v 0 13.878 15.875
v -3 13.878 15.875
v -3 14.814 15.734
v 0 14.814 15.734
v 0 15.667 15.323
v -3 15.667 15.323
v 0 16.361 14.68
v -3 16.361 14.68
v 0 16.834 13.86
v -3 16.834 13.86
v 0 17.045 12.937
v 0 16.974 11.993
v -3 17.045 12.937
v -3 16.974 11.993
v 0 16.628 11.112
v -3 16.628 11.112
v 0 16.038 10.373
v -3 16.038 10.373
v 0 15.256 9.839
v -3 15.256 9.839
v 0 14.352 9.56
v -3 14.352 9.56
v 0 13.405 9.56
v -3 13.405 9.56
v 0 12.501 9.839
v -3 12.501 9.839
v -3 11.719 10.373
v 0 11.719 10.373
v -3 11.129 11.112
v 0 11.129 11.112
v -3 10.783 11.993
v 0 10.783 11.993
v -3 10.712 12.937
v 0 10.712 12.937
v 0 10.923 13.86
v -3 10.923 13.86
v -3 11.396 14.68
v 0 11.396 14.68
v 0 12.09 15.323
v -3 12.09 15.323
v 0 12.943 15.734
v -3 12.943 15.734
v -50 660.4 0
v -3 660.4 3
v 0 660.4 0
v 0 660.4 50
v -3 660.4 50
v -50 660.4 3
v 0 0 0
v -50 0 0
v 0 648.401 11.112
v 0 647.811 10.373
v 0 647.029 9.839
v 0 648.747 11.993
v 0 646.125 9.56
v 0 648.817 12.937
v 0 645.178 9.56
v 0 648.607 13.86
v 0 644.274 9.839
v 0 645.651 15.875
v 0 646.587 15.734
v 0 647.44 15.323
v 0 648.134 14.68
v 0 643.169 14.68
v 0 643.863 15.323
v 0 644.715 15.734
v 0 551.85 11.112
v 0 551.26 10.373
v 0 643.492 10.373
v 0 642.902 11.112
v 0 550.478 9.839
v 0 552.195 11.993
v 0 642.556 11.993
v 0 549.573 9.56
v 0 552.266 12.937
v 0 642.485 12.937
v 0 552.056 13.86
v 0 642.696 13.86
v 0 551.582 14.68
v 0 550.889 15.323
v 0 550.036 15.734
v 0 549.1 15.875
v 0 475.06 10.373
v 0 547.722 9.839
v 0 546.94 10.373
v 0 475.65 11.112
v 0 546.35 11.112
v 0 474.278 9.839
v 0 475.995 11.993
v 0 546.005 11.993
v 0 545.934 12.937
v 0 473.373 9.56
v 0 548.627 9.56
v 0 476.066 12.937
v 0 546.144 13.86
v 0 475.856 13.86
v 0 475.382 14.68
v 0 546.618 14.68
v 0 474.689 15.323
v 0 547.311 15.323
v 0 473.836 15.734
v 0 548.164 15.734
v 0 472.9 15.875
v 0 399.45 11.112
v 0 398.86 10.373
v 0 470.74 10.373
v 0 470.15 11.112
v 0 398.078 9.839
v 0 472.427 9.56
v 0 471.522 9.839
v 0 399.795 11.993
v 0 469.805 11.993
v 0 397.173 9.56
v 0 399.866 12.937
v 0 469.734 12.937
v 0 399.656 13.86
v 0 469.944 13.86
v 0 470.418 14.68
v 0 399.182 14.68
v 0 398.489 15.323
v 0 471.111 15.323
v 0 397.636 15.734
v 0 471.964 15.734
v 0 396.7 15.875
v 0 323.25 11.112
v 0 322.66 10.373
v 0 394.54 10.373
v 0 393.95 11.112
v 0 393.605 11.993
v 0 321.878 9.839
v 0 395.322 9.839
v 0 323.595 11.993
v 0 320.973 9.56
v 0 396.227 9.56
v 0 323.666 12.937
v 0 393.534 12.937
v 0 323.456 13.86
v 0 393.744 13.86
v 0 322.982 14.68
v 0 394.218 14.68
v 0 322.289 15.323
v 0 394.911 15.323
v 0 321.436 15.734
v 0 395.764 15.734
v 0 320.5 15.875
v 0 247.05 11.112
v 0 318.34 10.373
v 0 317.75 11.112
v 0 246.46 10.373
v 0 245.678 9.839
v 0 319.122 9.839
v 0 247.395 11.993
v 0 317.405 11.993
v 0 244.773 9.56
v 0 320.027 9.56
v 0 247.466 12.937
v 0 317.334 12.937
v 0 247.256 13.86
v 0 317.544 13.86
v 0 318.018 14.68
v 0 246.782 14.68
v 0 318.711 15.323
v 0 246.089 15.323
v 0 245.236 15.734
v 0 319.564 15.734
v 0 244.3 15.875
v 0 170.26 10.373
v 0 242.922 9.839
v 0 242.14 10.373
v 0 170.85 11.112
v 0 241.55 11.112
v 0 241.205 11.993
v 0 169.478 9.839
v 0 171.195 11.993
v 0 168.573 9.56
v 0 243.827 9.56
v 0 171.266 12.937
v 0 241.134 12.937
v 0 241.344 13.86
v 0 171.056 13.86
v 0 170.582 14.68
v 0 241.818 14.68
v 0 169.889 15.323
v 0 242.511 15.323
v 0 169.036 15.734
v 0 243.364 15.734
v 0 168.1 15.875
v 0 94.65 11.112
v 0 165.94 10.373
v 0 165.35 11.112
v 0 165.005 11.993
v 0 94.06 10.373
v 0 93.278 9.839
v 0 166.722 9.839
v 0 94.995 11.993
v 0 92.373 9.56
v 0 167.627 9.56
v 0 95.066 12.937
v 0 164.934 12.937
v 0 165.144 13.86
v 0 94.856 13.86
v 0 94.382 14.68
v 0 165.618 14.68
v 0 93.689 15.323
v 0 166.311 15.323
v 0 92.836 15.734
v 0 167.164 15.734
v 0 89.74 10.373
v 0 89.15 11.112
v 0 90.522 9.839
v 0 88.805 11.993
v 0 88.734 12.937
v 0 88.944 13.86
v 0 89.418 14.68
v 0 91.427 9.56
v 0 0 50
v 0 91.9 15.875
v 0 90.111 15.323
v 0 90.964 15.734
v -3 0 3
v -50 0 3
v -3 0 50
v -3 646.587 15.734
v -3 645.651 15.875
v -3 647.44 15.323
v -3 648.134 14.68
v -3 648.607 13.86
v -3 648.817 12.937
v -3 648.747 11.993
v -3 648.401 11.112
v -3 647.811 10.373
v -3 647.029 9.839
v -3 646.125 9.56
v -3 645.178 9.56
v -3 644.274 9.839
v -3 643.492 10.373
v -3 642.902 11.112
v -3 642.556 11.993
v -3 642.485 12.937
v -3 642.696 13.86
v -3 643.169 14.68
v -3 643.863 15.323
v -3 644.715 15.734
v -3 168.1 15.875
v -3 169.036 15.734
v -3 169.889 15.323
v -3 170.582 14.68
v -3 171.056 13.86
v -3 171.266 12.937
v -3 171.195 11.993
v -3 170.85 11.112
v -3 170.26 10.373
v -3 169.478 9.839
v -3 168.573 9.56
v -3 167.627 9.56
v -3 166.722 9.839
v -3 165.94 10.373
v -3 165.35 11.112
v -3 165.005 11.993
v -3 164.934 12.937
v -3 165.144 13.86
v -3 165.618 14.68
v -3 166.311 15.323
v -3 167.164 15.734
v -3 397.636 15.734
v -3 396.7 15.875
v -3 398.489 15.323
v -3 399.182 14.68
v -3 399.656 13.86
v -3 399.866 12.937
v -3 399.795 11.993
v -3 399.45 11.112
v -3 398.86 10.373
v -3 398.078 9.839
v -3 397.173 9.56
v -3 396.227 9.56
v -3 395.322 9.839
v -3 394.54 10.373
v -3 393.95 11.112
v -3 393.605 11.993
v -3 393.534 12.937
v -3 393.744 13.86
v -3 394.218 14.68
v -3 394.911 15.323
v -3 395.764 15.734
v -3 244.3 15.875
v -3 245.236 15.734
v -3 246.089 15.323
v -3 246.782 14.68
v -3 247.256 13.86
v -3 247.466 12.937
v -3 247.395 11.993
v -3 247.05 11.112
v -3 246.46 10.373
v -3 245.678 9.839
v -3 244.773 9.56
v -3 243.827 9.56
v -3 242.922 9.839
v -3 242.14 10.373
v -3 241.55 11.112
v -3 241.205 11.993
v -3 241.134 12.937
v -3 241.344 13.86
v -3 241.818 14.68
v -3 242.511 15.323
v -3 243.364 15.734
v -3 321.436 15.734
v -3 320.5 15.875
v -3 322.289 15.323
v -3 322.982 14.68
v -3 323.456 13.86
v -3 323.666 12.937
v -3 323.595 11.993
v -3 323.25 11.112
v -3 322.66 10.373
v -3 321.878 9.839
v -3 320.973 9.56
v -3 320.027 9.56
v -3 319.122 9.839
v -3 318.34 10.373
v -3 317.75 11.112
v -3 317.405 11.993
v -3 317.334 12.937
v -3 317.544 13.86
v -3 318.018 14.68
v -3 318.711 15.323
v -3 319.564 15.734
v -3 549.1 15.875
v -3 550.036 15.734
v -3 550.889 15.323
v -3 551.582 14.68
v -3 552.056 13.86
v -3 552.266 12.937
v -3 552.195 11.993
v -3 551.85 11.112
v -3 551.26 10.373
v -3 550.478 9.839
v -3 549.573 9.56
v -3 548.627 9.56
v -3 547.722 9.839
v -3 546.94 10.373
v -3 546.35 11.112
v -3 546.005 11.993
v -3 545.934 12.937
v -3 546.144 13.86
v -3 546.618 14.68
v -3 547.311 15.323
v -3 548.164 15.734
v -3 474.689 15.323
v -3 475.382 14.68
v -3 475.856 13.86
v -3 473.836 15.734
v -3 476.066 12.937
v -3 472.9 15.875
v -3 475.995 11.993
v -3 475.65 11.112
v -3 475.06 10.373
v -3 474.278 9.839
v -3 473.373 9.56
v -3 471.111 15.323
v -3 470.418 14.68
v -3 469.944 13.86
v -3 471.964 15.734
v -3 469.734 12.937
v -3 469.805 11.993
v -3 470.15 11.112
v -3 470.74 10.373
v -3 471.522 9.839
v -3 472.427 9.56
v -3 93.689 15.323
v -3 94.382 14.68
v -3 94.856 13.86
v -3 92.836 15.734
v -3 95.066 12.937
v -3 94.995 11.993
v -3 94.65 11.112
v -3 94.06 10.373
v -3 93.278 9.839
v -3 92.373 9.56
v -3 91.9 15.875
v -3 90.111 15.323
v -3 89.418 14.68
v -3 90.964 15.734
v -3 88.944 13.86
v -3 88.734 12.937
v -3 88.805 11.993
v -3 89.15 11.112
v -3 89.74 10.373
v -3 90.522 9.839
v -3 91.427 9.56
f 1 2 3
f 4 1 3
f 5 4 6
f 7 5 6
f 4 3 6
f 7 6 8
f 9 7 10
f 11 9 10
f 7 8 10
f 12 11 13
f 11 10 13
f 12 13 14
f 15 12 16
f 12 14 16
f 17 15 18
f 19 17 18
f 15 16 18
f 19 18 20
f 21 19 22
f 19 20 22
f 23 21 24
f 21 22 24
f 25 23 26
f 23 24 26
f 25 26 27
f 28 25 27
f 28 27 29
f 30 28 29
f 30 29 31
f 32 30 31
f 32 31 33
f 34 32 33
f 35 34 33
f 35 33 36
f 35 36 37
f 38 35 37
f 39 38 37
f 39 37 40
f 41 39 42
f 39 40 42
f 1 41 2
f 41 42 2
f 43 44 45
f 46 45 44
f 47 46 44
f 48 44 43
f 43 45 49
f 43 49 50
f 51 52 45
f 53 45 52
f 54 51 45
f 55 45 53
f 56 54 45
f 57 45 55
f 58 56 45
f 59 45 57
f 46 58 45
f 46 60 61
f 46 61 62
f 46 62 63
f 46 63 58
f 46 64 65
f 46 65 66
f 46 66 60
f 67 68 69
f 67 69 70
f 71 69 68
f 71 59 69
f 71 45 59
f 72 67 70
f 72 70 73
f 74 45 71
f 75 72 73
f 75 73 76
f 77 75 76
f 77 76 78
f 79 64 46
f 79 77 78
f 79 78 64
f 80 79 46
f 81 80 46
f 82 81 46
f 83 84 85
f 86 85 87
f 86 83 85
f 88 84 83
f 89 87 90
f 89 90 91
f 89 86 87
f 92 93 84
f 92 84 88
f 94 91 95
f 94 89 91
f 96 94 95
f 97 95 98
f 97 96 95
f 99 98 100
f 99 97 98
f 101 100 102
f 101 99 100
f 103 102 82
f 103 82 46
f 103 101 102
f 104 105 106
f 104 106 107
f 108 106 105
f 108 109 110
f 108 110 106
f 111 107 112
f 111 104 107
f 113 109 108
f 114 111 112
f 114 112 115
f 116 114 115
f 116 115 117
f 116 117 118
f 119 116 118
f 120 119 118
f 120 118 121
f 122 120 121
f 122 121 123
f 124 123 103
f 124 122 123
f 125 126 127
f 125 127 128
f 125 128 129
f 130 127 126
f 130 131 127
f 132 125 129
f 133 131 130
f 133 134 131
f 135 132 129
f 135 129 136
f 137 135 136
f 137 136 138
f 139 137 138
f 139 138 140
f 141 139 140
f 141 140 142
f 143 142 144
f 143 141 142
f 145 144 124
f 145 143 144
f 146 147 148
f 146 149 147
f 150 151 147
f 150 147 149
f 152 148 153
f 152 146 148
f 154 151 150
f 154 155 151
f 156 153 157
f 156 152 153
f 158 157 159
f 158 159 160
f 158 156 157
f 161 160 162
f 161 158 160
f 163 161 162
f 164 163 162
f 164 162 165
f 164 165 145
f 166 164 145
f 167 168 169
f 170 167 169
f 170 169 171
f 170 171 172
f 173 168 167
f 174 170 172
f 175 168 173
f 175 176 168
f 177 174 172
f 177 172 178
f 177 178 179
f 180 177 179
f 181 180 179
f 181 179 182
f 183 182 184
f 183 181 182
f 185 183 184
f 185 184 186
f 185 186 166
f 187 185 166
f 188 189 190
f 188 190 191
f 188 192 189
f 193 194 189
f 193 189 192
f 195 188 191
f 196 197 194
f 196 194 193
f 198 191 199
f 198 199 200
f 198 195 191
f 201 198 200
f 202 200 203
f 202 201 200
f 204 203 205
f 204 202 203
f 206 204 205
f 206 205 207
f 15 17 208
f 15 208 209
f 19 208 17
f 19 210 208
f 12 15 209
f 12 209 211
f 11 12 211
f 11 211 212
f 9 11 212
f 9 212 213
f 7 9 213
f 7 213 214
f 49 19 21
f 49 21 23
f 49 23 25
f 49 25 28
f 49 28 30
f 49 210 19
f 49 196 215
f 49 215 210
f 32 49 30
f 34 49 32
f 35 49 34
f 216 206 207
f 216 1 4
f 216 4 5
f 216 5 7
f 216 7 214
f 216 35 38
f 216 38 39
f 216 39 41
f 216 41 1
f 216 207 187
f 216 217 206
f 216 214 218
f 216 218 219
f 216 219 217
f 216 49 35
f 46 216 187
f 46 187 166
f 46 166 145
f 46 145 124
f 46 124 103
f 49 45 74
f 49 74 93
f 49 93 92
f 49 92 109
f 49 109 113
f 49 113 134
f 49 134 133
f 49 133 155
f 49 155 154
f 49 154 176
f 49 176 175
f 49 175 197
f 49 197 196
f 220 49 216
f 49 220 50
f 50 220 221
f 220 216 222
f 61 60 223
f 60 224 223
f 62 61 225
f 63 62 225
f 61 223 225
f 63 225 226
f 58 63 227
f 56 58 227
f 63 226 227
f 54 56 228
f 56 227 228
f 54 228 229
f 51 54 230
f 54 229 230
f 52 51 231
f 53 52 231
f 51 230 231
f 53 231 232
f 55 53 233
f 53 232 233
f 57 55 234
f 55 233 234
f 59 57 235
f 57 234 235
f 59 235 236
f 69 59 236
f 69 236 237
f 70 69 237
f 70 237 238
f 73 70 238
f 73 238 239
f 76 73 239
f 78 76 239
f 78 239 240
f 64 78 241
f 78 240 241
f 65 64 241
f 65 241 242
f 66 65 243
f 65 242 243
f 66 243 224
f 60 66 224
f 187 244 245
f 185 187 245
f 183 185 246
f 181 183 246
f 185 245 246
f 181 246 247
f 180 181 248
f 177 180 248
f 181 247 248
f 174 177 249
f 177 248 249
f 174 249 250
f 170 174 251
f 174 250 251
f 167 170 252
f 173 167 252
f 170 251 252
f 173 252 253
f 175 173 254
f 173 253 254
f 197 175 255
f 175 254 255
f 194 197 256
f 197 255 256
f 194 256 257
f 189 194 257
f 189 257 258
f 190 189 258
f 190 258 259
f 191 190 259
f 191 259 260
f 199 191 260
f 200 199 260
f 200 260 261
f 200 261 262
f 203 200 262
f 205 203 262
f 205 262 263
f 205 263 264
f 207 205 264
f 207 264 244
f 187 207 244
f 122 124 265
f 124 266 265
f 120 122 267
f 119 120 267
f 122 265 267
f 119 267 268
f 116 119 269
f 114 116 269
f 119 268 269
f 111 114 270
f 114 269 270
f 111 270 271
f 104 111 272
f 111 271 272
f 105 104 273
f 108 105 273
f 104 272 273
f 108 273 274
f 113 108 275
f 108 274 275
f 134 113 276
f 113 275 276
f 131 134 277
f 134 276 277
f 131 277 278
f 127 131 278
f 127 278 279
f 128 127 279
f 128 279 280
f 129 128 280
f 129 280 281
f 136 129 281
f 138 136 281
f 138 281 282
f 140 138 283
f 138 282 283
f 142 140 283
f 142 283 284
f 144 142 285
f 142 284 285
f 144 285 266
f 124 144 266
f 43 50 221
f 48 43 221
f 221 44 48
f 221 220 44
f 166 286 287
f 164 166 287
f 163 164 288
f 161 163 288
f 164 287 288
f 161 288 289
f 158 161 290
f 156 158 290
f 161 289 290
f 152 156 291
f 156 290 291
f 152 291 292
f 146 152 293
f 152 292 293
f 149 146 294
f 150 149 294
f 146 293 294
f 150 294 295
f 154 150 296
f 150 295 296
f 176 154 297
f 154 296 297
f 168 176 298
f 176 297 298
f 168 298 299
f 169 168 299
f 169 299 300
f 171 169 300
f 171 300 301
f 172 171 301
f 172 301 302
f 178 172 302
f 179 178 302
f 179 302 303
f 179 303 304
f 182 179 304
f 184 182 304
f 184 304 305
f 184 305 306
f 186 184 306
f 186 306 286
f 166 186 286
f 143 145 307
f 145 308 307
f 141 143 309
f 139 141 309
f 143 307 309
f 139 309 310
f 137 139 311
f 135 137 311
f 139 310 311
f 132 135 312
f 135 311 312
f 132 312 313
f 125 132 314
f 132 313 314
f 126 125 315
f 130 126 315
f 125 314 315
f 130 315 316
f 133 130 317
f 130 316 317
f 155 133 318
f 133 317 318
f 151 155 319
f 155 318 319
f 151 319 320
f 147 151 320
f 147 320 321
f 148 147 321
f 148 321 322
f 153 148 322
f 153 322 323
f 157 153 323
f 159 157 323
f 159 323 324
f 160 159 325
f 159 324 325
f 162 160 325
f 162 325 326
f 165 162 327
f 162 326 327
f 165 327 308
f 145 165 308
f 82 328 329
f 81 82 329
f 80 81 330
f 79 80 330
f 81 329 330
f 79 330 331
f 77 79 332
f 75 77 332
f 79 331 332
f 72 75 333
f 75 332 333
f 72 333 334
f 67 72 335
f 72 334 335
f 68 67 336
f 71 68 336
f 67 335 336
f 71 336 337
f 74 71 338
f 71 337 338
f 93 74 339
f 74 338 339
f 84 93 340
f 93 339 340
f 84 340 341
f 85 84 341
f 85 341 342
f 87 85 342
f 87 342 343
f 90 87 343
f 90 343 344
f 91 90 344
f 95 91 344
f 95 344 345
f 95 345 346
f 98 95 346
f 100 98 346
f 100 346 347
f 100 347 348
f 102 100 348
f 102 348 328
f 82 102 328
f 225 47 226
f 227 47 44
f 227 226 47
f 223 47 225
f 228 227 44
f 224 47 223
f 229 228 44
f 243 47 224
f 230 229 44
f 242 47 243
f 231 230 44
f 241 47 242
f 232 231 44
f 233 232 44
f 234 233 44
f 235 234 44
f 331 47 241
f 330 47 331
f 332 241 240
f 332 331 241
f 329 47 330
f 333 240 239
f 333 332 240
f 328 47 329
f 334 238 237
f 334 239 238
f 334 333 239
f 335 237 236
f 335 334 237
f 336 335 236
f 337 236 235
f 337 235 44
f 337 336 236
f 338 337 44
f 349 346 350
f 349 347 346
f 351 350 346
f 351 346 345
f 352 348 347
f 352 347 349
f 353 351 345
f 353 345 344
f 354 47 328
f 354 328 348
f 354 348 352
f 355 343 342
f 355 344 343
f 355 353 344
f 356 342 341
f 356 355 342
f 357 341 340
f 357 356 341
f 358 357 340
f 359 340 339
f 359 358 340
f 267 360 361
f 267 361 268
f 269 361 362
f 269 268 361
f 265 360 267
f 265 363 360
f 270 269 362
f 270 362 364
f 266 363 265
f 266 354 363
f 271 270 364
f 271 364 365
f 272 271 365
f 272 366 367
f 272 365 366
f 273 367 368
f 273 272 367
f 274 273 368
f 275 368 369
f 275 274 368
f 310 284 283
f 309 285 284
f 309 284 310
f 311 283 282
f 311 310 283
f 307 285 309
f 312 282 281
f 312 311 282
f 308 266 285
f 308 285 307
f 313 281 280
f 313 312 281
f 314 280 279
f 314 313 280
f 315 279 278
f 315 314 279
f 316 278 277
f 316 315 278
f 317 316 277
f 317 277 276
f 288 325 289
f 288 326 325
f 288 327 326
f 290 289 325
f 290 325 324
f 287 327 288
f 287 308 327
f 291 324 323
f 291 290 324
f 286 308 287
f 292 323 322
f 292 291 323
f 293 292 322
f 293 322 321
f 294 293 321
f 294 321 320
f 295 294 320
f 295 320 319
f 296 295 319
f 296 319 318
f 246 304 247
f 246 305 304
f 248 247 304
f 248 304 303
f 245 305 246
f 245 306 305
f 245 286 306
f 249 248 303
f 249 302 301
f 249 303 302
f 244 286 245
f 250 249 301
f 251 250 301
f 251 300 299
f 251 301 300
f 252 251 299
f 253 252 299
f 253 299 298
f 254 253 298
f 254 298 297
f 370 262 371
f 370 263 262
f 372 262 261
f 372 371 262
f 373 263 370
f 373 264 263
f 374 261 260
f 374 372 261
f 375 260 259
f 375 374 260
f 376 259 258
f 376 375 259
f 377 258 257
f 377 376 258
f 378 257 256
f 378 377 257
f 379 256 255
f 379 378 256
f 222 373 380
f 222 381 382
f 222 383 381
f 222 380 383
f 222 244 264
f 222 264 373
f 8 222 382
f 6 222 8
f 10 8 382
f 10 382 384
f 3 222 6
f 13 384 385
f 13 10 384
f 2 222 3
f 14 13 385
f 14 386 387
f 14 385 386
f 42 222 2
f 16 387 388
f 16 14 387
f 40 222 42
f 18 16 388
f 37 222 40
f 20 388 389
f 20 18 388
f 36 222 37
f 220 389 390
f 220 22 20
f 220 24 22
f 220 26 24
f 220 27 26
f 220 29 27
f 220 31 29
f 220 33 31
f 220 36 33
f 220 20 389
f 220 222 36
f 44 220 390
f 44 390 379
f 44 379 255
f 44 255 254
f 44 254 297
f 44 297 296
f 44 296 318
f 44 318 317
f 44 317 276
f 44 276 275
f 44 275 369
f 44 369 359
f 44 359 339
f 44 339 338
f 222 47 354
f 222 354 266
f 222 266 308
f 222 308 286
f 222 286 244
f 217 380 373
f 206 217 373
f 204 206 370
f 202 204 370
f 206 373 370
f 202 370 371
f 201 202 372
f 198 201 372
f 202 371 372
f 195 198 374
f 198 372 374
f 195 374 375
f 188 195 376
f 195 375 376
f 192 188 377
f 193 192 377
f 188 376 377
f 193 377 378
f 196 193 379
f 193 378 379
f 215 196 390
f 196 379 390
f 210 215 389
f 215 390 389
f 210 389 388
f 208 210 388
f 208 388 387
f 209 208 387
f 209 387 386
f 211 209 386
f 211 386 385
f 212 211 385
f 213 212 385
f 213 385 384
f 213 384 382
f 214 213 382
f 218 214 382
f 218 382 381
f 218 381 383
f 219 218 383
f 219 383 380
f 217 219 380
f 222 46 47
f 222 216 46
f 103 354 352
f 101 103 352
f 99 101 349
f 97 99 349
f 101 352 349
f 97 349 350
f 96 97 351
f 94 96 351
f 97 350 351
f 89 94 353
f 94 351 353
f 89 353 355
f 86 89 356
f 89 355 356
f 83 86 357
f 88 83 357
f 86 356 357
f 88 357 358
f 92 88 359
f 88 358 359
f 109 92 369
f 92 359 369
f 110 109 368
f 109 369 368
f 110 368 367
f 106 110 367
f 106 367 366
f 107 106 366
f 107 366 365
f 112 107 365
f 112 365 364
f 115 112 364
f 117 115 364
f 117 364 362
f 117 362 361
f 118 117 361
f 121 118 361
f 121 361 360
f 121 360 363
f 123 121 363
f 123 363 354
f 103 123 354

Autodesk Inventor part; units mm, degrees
ref_plane "YZ Plane" through (0, 0, 0) normal (1, 0, 0) x (0, 1, 0)
ref_plane "XZ Plane" through (0, 0, 0) normal (0, 1, 0) x (-1, 0, 0)
ref_plane "XY Plane" through (0, 0, 0) normal (0, 0, 1) x (1, 0, 0)
sketch "Sketch1" plane through (0, 0, 0) normal (0, 1, 0) x (-1, 0, 0)
  line L0 (0, 0) -> (50, 0)
  line L1 (50, 0) -> (50, 3)
  line L2 (0, 0) -> (0, 50)
  line L3 (0, 50) -> (3, 50)
  line L4 (3, 50) -> (3, 3)
  line L5 (3, 3) -> (50, 3)
  dimension "d0" = 50
  dimension "d1" = 3
  dimension "d2" = 50
  dimension "d3" = 3
extrude "Extrusion1" add sketch "Sketch1" along normal blind 660.4
sketch "Sketch2" plane through (-3, 0, 3) normal (-1, 0, 0) x (0, 0, 1)
  line L0 (0, 0) -> (47, 0) projected
  line L1 (-3, 0) -> (-3, 660.4) projected
  line L2 (-3, 13.8784) -> (9.7, 13.8784) construction
  line L3 (9.7, 0) -> (9.7, 15.7) construction
  line L4 (9.7, 0) -> (25.4, 0) construction
  line L5 (9.7, 15.7) -> (9.7, 91.9) construction
  line L6 (9.7, 91.9) -> (9.7, 168.1) construction
  line L7 (9.7, 168.1) -> (9.7, 244.3) construction
  line L8 (9.7, 244.3) -> (9.7, 320.5) construction
  line L9 (9.7, 320.5) -> (9.7, 396.7) construction
  line L10 (9.7, 396.7) -> (9.7, 472.9) construction
  line L11 (9.7, 472.9) -> (9.7, 549.1) construction
  line L12 (0, 660.4) -> (47, 660.4) construction
  line L13 (9.7, 661.3513) -> (9.7, 645.6513) construction
  line L14 (9.7, 549.1) -> (9.7, 625.3) construction
  circle A0 centre (9.7, 645.6513) radius 3.175
  circle A1 centre (9.7, 549.1) radius 3.175
  circle A2 centre (9.7, 472.9) radius 3.175
  circle A3 centre (9.7, 396.7) radius 3.175
  circle A4 centre (9.7, 320.5) radius 3.175
  circle A5 centre (9.7, 244.3) radius 3.175
  circle A6 centre (9.7, 168.1) radius 3.175
  circle A7 centre (9.7, 91.9) radius 3.175
  circle A8 centre (9.7, 13.8784) radius 3.175
  dimension "d26" = 12.7
  dimension "d28" = 15.7
  dimension "d29" = 90
  dimension "d30" = 76.2
  dimension "d31" = 180
  dimension "d32" = 76.2
  dimension "d33" = 180
  dimension "d34" = 76.2
  dimension "d35" = 180
  dimension "d36" = 76.2
  dimension "d37" = 180
  dimension "d38" = 76.2
  dimension "d39" = 180
  dimension "d40" = 76.2
  dimension "d41" = 180
  dimension "d42" = 76.2
  dimension "d43" = 180
  dimension "d44" = 15.7
  dimension "d45" = 76.2
  dimension "d46" = 6.35
  dimension "d47" = 6.35
  dimension "d48" = 6.35
  dimension "d49" = 6.35
  dimension "d50" = 6.35
  dimension "d51" = 6.35
  dimension "d52" = 6.35
  dimension "d53" = 6.35
  dimension "d54" = 6.35
extrude "Extrusion2" cut sketch "Sketch2" against normal blind 25.4
properties part number "26in Angle Channel" material "Aluminum 6061"
